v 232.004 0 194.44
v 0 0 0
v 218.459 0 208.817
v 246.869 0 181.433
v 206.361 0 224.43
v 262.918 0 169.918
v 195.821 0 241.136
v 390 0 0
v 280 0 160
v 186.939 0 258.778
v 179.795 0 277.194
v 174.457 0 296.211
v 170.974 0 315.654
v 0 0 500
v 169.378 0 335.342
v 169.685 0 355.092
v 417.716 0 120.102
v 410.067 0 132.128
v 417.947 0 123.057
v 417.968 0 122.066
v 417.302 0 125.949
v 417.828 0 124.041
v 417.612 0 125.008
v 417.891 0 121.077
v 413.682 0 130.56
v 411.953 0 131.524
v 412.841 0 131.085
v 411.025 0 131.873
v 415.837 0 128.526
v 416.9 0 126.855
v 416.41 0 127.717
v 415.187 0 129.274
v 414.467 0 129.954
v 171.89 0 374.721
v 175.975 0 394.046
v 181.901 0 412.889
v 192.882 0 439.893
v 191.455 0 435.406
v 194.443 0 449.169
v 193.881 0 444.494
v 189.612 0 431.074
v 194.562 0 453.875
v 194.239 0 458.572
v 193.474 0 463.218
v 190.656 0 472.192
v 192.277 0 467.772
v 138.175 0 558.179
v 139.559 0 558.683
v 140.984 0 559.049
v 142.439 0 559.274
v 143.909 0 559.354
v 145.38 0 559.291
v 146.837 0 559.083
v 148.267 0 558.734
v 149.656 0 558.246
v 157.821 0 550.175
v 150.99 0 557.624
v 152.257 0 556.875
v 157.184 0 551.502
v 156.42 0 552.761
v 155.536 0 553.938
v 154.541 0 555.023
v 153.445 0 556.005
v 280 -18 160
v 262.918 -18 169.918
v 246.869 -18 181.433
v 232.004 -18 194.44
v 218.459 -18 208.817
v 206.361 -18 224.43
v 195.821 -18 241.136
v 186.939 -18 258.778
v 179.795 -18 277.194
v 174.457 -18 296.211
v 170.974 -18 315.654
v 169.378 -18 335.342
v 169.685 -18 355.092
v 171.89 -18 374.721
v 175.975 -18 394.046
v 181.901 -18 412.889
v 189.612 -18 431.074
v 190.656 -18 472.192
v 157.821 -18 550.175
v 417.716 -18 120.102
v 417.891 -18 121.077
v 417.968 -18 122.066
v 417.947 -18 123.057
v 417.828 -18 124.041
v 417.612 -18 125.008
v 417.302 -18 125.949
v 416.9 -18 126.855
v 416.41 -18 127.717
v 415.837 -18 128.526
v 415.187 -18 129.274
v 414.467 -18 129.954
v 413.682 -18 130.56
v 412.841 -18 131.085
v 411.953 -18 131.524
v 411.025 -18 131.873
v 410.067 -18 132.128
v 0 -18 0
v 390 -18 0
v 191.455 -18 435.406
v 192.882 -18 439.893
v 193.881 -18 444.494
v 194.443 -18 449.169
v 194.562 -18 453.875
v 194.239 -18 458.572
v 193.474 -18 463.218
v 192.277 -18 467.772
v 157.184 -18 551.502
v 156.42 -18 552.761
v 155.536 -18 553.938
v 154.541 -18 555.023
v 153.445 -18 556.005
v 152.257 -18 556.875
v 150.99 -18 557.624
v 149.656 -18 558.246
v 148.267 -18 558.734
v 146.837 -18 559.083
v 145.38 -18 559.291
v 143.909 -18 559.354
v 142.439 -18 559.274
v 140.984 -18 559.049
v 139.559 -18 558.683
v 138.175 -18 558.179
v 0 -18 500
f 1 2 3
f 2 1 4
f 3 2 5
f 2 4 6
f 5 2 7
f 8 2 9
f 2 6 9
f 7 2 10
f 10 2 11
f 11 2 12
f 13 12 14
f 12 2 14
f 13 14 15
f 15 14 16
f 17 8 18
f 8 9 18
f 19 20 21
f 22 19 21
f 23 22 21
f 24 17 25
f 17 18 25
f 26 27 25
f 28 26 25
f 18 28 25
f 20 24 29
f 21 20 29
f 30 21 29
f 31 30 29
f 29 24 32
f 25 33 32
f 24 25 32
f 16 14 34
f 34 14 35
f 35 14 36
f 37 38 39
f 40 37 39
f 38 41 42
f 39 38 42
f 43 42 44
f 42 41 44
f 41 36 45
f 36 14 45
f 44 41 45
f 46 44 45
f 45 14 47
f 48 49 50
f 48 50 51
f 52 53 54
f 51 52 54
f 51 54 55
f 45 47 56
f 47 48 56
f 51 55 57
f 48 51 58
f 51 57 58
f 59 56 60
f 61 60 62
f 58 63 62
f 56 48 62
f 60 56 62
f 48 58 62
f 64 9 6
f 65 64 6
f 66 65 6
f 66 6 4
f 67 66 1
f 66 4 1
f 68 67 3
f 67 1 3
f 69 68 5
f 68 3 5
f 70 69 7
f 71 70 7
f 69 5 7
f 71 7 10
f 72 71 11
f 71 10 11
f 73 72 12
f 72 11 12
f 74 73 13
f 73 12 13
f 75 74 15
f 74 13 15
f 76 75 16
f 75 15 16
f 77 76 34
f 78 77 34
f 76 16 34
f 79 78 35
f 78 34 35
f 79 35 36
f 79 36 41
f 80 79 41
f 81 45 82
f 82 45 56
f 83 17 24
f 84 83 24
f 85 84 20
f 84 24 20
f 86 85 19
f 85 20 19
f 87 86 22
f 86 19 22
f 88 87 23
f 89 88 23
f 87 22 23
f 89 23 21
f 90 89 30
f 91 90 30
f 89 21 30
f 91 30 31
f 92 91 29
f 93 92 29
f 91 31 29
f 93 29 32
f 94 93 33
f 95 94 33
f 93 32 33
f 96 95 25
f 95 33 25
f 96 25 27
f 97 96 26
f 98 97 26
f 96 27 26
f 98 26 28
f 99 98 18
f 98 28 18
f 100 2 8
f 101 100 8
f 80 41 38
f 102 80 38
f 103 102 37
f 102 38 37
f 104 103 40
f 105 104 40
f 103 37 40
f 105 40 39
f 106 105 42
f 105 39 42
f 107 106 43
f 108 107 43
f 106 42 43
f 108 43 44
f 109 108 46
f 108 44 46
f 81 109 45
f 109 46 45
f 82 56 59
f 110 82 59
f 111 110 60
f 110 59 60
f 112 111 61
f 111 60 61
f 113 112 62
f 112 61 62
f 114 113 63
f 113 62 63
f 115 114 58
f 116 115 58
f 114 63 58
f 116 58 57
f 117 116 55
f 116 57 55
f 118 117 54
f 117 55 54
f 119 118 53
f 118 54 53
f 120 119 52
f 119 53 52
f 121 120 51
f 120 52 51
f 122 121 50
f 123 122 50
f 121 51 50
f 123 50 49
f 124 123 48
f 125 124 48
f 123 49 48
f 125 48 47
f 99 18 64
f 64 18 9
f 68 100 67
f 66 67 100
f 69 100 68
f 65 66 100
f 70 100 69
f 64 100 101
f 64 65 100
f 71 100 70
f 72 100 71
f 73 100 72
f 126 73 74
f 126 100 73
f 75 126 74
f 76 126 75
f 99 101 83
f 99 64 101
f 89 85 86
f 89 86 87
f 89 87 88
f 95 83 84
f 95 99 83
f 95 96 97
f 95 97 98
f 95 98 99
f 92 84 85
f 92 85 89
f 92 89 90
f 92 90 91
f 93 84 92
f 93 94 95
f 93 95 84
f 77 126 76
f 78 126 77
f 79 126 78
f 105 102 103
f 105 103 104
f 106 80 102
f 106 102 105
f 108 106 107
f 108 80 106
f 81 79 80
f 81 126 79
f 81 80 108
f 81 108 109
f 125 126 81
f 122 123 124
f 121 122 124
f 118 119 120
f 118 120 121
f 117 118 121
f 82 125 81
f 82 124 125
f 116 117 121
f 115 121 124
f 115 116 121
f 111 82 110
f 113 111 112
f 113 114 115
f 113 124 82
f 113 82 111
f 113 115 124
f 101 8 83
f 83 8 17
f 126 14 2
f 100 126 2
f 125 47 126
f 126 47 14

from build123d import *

# Parameters (mm, degrees)
F1_DEPTH = 18


with BuildPart() as f1:
    # F0 (on Front) → F1 (new body)
    with BuildSketch(Plane.XZ):
        with BuildLine():
            Line((0, 500), (0, 0))
            Line((0, 0), (390, 0))
            Line((390, 0), (417.715809, 120.10184))
            ThreePointArc((417.715809, 120.10184), (416.41, 127.716852), (410.067188, 132.12846))
            Line((410.067188, 132.12846), (280, 160))
            ThreePointArc((280, 160), (179.794974, 277.193689), (189.612331, 431.073602))
            ThreePointArc((189.612331, 431.073602), (194.55811, 451.520543), (190.655976, 472.192056))
            Line((190.655976, 472.192056), (157.820855, 550.175469))
            ThreePointArc((157.820855, 550.175469), (149.655778, 558.246), (138.175469, 558.179145))
            Line((138.175469, 558.179145), (0, 500))
        make_face()
    extrude(amount=F1_DEPTH)


solid = f1.part
